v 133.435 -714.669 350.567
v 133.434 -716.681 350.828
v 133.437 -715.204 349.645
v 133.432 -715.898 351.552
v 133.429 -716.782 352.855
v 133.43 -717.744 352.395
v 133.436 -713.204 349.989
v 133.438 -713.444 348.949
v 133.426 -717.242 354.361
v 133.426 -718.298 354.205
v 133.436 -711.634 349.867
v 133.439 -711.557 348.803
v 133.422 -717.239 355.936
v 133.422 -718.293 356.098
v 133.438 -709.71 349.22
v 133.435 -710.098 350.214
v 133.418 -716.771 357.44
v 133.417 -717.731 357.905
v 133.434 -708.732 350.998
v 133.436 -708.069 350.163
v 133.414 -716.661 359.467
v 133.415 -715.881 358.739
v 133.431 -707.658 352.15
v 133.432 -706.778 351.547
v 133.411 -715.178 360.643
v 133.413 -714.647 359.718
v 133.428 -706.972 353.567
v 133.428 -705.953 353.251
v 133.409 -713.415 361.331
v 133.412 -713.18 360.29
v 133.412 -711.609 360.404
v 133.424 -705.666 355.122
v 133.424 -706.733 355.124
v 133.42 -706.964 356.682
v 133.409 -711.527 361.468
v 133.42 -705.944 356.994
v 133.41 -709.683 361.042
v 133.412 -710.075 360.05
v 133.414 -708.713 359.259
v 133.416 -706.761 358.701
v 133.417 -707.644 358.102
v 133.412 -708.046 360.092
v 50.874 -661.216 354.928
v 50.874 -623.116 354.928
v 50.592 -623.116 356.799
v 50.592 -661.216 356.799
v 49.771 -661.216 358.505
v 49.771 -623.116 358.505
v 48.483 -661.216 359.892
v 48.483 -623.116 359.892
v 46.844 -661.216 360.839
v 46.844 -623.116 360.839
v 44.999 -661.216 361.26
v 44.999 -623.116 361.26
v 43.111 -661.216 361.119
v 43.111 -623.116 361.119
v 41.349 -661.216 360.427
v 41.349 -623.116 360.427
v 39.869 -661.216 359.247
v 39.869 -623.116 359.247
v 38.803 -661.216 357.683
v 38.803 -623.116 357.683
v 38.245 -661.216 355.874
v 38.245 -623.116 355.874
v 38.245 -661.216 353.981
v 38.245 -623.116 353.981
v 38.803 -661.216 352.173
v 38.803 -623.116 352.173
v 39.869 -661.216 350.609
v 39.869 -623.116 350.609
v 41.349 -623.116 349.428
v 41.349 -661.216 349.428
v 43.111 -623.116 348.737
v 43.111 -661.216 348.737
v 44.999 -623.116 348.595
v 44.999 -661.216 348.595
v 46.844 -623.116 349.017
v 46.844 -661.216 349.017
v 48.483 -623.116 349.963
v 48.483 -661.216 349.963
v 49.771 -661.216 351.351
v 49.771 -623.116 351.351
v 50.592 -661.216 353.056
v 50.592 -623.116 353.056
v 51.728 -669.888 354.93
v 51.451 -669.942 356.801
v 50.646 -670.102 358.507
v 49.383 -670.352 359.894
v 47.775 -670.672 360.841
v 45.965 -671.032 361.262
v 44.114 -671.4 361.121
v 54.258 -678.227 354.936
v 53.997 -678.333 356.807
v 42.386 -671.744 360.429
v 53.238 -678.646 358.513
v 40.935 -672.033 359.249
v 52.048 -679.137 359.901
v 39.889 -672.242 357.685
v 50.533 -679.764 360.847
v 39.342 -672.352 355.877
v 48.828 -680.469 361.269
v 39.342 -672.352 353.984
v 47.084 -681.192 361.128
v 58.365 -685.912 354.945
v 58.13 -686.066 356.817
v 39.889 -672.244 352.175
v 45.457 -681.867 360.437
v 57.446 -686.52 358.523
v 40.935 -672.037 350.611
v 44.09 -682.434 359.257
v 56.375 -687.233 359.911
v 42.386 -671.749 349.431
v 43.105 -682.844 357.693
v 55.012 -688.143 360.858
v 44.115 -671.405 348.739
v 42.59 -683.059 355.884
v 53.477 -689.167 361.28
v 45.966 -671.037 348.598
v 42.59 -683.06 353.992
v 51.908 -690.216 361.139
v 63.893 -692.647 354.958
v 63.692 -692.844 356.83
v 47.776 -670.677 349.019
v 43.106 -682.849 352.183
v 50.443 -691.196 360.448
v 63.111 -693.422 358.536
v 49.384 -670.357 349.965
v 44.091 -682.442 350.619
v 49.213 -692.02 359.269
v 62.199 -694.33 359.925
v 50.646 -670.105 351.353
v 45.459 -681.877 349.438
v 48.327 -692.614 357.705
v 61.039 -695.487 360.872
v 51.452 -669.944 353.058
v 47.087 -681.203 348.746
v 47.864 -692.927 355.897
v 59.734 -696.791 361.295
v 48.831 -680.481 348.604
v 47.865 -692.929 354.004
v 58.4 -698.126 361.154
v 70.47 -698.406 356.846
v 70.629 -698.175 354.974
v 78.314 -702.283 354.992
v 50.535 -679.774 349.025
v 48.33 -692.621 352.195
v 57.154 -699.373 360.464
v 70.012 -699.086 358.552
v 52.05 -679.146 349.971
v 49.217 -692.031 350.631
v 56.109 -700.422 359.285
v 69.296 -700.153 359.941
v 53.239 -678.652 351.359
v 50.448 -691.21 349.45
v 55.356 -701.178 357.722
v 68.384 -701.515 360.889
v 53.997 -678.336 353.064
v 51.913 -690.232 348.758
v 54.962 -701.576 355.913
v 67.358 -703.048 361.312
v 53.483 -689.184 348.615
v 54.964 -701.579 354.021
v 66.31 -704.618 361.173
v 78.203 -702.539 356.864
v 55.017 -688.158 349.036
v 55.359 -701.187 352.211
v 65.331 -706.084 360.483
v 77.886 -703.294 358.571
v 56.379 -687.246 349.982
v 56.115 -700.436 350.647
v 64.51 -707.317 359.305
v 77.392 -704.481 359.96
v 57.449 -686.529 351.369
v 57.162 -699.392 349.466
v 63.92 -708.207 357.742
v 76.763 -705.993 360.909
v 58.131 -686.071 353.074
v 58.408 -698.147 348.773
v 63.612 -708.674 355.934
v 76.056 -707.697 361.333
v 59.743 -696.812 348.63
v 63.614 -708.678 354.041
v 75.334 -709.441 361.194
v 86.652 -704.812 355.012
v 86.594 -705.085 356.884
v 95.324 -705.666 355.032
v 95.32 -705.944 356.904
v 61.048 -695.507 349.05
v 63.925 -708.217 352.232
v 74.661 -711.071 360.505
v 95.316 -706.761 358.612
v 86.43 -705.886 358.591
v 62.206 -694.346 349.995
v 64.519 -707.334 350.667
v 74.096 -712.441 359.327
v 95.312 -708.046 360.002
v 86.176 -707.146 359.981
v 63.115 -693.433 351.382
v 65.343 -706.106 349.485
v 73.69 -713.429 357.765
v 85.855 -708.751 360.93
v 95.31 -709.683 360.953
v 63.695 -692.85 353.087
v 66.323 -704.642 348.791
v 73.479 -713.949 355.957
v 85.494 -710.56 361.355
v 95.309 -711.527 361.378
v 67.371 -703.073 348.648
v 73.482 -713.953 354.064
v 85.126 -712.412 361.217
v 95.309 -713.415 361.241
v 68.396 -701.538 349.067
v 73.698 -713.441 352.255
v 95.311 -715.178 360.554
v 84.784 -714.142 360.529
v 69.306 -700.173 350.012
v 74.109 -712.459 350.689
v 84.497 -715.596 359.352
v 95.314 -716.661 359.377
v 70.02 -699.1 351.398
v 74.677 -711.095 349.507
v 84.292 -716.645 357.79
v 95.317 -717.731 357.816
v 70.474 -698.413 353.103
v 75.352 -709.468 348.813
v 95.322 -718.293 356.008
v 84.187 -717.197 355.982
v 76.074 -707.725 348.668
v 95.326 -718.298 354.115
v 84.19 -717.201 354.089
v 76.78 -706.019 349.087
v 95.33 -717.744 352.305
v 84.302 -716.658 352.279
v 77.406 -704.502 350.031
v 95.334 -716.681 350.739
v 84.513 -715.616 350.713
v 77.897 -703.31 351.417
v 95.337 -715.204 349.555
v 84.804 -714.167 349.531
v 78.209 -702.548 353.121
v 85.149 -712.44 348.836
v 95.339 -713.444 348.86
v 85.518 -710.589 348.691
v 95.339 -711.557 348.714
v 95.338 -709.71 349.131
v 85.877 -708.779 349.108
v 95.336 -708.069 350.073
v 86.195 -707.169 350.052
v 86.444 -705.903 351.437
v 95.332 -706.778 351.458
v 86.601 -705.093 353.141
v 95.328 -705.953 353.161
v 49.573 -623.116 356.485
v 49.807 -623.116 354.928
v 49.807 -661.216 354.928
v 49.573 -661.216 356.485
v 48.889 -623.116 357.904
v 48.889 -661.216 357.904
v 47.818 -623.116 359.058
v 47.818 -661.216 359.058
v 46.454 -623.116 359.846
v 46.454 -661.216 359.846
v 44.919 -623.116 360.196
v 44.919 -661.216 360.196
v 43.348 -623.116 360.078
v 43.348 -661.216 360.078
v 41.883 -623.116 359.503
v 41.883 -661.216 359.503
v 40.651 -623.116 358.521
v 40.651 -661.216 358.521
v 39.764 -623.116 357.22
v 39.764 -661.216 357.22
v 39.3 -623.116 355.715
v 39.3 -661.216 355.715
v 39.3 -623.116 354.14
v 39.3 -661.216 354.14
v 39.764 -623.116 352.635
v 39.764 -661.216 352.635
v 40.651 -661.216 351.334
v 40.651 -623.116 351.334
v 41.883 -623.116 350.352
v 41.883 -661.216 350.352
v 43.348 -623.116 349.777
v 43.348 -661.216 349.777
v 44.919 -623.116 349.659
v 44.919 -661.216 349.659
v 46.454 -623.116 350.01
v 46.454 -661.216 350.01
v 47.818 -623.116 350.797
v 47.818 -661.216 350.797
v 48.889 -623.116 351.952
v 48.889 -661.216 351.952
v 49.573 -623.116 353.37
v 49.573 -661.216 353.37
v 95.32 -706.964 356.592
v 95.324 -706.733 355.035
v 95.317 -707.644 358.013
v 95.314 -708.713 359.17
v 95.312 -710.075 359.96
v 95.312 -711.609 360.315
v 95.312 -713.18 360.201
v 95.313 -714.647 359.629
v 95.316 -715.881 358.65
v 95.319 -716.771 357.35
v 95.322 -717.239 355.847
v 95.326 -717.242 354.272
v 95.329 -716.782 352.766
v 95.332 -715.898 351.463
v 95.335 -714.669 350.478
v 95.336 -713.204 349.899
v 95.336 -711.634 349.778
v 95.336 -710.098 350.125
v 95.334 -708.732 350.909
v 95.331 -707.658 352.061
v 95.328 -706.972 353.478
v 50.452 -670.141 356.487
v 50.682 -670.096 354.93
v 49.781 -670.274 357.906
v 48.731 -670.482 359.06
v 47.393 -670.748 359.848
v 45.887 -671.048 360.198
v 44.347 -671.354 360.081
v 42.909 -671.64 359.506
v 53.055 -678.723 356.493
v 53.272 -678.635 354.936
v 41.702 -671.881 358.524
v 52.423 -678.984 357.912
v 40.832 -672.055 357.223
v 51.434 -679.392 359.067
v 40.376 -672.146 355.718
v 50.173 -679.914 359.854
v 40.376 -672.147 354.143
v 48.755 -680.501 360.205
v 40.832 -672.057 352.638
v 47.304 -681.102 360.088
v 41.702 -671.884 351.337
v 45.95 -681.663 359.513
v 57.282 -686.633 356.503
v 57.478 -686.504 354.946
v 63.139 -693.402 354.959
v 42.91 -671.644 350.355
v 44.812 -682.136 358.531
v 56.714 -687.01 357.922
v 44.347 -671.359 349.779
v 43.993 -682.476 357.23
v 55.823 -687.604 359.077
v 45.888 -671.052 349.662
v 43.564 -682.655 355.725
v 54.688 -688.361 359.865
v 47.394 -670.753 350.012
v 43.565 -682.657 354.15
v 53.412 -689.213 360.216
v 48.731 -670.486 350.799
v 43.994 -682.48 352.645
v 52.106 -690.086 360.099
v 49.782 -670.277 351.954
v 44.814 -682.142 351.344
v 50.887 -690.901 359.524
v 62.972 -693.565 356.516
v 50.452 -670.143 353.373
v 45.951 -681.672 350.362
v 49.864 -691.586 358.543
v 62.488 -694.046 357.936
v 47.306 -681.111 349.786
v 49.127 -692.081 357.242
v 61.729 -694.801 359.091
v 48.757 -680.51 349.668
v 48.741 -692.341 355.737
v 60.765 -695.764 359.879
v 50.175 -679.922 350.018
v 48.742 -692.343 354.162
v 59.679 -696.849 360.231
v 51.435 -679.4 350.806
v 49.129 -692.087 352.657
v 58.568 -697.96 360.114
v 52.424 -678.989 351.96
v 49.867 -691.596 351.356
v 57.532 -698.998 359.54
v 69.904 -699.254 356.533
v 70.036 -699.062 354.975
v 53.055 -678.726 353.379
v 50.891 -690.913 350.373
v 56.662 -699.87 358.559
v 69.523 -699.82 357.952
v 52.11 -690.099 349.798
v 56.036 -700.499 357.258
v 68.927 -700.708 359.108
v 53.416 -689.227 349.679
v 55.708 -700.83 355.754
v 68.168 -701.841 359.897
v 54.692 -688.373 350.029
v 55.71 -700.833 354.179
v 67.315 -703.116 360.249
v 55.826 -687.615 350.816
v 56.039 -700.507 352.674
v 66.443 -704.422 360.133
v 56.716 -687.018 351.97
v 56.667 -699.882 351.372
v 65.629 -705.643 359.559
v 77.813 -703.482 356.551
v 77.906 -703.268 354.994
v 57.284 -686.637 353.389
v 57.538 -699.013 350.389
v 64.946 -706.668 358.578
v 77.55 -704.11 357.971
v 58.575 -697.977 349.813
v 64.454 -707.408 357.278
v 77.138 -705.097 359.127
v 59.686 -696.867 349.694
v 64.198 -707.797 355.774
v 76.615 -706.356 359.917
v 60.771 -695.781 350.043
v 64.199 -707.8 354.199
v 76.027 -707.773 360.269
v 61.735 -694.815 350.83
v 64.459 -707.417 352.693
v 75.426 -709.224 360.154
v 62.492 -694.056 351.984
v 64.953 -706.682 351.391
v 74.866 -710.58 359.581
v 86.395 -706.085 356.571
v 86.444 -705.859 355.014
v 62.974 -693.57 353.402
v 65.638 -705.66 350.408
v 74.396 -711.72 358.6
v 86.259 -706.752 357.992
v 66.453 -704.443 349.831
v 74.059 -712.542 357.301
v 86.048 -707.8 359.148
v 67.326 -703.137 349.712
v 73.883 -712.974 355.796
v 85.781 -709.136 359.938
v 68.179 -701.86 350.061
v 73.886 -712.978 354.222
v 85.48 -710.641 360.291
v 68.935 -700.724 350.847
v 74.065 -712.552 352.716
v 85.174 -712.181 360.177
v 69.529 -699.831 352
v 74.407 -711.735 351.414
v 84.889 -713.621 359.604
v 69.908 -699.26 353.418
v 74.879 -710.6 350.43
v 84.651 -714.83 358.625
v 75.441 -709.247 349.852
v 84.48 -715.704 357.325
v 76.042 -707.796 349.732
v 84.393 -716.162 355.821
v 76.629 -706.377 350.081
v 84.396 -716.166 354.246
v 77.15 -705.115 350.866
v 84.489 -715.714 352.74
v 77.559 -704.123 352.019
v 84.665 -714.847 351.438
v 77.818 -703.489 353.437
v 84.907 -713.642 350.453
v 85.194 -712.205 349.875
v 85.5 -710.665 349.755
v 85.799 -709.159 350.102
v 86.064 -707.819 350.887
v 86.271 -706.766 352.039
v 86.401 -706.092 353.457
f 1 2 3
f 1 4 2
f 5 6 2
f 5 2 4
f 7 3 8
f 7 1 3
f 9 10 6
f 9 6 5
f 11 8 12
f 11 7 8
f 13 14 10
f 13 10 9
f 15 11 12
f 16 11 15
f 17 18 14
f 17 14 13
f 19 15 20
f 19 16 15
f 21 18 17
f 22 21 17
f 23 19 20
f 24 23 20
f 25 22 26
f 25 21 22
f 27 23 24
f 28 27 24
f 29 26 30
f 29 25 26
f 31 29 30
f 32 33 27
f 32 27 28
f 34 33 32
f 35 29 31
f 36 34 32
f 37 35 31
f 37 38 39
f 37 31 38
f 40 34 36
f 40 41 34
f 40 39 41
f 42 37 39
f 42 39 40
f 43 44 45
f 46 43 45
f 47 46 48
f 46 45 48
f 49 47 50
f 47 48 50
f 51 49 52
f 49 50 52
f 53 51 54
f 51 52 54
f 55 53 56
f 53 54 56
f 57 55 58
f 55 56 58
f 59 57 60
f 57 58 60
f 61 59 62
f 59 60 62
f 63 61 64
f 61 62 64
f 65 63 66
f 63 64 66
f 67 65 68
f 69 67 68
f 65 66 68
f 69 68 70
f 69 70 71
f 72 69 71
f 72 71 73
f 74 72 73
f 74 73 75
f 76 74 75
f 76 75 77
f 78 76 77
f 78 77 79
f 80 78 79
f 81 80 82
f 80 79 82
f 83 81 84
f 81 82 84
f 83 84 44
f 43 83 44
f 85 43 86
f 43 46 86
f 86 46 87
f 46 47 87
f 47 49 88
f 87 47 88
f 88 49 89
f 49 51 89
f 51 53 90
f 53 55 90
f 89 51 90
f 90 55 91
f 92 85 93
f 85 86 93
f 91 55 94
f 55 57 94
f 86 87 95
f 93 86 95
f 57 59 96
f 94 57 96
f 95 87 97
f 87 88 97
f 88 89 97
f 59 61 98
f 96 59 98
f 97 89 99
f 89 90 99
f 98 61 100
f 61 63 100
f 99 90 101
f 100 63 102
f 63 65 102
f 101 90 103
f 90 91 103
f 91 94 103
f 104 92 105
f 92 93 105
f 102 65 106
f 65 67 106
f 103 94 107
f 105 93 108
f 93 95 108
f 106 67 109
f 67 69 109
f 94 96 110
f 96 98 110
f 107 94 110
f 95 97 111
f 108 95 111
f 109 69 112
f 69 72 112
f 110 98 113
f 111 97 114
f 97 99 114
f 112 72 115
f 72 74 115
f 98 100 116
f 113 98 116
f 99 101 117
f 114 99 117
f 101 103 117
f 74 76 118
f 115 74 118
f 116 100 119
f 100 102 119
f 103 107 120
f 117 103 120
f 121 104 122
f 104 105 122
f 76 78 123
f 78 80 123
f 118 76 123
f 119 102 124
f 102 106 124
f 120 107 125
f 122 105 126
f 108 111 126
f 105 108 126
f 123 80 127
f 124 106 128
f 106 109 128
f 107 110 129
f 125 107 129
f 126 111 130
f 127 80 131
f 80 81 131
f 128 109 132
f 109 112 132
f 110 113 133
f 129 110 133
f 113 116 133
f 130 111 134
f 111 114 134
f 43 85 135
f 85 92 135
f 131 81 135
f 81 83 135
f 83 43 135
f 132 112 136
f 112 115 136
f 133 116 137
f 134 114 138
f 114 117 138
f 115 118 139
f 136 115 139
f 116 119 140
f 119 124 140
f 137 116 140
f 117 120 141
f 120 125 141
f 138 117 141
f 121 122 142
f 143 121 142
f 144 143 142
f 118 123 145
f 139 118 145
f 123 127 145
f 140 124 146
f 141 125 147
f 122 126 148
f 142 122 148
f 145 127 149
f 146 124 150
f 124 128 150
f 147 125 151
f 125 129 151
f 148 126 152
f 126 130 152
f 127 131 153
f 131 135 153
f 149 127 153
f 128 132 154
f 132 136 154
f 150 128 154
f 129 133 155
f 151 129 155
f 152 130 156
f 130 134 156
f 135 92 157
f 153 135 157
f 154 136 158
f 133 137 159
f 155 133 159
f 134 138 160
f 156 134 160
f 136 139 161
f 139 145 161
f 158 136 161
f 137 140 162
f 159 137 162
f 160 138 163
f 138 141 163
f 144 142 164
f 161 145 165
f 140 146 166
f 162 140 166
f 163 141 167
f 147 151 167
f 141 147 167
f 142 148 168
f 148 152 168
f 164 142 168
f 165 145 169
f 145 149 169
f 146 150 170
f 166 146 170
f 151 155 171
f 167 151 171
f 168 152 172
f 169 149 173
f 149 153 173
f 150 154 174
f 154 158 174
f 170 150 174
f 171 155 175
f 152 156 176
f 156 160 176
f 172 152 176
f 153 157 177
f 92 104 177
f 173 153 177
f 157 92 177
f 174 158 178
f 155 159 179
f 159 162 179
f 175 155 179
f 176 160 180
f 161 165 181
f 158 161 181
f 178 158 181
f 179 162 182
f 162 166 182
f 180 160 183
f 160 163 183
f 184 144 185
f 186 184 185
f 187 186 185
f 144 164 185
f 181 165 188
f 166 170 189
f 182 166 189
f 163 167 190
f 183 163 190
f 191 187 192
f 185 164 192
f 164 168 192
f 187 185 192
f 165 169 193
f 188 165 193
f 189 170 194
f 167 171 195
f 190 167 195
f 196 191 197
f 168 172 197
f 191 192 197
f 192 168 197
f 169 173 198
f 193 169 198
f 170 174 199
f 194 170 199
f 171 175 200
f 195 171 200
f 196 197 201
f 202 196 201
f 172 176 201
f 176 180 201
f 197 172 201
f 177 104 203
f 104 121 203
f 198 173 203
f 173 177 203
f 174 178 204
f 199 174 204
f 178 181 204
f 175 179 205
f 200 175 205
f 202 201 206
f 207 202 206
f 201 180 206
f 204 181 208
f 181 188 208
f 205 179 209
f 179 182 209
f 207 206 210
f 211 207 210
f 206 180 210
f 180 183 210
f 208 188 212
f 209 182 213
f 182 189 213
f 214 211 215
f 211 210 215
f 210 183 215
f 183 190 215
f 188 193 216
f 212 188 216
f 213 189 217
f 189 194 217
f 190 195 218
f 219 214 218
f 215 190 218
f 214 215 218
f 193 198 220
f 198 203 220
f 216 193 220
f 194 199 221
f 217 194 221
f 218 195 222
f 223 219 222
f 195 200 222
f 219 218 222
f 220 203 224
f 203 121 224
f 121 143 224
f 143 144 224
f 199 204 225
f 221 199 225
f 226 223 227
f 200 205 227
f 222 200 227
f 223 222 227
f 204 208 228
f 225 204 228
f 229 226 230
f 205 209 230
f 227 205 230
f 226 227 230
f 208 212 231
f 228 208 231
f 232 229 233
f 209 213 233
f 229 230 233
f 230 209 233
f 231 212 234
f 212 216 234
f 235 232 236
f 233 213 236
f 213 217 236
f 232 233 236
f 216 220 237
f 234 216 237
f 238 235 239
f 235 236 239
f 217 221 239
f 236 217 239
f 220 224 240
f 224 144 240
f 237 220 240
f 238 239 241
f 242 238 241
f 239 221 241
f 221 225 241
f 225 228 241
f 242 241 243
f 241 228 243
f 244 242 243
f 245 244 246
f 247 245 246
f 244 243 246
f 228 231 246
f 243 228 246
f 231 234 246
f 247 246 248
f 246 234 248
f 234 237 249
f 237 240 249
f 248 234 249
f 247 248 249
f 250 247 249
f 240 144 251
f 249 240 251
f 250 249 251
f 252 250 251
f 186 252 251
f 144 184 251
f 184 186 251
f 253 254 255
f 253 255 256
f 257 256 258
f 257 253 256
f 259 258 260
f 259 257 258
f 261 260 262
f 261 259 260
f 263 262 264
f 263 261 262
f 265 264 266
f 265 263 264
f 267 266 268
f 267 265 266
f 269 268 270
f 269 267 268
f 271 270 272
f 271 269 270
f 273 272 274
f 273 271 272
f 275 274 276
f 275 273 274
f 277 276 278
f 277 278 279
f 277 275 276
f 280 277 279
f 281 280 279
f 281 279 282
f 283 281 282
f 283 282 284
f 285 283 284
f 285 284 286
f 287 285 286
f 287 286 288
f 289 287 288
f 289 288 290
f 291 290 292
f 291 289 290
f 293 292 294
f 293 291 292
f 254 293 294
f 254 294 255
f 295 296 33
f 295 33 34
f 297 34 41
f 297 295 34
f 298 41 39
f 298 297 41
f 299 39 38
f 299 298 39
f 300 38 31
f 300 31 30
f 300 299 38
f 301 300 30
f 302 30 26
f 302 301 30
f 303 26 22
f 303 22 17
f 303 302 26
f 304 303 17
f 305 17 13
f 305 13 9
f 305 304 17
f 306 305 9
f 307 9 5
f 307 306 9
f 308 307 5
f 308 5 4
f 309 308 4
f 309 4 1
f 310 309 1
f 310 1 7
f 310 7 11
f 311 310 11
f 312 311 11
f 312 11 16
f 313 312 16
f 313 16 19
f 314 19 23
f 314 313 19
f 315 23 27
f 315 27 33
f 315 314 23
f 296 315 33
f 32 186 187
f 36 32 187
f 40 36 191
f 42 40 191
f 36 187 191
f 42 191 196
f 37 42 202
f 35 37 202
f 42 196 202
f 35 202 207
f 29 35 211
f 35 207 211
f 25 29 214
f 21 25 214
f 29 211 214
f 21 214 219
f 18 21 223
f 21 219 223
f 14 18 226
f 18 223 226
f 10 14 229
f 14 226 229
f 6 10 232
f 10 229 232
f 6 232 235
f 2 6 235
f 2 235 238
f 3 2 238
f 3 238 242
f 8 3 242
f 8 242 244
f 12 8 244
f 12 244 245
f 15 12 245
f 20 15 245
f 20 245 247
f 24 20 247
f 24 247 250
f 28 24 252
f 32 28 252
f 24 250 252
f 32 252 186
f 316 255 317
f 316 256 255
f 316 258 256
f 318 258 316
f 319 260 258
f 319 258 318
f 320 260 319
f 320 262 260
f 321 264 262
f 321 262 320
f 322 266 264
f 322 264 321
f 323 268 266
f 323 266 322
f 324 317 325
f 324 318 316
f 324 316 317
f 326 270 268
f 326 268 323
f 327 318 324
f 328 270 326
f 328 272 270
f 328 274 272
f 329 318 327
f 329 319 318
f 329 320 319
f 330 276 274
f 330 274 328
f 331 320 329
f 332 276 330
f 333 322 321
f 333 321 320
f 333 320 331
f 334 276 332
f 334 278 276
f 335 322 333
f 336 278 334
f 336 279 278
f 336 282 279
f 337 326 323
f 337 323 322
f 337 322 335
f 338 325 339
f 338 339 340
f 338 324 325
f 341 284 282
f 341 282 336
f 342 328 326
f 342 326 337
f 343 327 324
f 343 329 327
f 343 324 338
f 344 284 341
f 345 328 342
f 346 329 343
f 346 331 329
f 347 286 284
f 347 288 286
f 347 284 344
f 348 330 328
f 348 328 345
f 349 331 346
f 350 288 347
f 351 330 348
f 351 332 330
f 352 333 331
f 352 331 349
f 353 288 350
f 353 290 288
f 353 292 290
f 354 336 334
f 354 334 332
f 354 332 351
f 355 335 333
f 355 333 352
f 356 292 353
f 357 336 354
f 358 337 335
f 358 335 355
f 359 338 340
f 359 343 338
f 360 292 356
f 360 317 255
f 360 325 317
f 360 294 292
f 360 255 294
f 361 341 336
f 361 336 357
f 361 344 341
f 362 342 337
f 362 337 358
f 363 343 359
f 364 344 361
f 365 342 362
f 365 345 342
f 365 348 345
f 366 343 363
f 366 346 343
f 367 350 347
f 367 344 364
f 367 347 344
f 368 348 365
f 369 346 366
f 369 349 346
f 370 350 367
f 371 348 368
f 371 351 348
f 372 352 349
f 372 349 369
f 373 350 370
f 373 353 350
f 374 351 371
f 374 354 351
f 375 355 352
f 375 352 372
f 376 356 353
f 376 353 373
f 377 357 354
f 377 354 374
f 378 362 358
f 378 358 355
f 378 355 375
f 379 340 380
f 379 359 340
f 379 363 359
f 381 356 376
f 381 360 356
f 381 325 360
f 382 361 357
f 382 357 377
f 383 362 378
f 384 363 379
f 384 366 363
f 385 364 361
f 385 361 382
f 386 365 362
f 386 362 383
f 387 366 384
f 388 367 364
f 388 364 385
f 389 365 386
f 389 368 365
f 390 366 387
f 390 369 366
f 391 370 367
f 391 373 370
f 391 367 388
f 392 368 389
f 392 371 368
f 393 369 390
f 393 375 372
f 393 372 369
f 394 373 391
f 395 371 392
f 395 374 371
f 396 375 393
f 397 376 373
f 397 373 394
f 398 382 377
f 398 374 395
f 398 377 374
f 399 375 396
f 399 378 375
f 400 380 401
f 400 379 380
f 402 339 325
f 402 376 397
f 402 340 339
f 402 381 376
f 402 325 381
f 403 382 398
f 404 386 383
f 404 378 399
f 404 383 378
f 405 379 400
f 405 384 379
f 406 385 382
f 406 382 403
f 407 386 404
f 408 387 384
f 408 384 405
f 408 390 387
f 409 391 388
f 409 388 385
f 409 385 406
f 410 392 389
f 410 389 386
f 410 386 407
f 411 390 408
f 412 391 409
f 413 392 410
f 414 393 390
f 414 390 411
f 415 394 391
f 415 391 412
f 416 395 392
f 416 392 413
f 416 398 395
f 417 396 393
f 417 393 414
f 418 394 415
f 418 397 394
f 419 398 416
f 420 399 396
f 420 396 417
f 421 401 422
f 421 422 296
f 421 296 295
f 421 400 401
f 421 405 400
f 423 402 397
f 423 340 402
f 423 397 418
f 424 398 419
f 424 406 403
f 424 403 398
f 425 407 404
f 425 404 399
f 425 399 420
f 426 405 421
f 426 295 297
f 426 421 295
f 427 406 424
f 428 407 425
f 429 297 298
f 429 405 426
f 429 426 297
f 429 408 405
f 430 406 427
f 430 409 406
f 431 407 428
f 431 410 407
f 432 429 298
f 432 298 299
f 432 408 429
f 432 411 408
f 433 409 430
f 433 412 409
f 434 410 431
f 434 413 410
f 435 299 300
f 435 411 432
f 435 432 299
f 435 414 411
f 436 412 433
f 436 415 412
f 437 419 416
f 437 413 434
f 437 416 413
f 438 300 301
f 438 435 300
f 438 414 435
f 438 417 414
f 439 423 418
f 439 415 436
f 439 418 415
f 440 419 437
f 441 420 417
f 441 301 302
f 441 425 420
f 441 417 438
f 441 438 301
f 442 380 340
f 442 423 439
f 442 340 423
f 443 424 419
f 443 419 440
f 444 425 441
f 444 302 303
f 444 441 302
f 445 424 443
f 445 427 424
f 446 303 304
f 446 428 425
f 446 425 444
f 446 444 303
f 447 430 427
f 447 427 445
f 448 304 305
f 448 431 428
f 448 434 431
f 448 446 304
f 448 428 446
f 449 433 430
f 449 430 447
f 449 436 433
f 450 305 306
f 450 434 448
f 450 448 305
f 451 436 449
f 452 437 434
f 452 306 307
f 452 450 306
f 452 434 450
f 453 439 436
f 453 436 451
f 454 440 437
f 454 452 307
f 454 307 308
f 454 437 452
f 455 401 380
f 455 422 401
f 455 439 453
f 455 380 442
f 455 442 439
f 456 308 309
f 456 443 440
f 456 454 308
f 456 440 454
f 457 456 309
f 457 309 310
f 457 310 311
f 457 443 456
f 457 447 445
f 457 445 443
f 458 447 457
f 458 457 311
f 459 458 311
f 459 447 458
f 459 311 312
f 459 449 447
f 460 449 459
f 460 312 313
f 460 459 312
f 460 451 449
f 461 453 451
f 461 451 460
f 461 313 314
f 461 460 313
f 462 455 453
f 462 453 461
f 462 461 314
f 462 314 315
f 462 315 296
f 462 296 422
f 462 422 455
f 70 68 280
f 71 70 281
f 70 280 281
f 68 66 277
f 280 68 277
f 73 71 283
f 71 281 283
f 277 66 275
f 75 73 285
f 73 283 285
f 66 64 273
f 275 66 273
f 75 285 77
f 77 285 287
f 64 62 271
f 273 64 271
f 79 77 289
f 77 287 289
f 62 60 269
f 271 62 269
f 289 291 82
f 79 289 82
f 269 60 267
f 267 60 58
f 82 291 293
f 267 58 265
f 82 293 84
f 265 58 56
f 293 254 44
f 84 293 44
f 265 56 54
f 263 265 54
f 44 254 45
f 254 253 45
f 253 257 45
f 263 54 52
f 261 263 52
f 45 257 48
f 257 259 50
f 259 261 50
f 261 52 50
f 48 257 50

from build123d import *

# Parameters (mm, degrees)
SKETCH1_R                 = 6.35
SKETCH1_R_2               = 5.2832
PIPE_0_5_SCH_40_1_DEPTH   = 38.1
SKETCH1_ON_SEGMENT_2_R    = 6.35
SKETCH1_ON_SEGMENT_2_R_2  = 5.2832
PIPE_0_5_SCH_40_1_2_ANGLE = 90
SKETCH1_ON_SEGMENT_3_R    = 6.35
SKETCH1_ON_SEGMENT_3_R_2  = 5.2832
PIPE_0_5_SCH_40_1_3_DEPTH = 38.1


with BuildPart() as part:
    # Sketch1 → Pipe 0.5 SCH 40(1) (new body)
    with BuildSketch(Plane(origin=(44.524118781, -623.116394341, 354.927728694), x_dir=(1, 0, 0), z_dir=(0, -1, 0))):
        Circle(SKETCH1_R)
        Circle(SKETCH1_R_2, mode=Mode.SUBTRACT)
    extrude(amount=PIPE_0_5_SCH_40_1_DEPTH)


with BuildPart() as body_2:
    # Sketch1 on segment 2 (carried to the start of arc 2) → Pipe 0.5 SCH 40_1 2 (revolve)
    with BuildSketch(Plane(origin=(44.524118781, -661.216394341, 354.927728694), x_dir=(1, 0, 0), z_dir=(0, -1, 0))):
        Circle(SKETCH1_ON_SEGMENT_2_R)
        Circle(SKETCH1_ON_SEGMENT_2_R_2, mode=Mode.SUBTRACT)
    revolve(axis=Axis((95.323978696, -661.216394341, 355.047029303), (-0.002348437, 0, 0.999997242)), revolution_arc=PIPE_0_5_SCH_40_1_2_ANGLE)


with BuildPart() as body_3:
    # Sketch1 on segment 3 (carried to segment 3) → Pipe 0.5 SCH 40_1 3 (new body)
    with BuildSketch(Plane(origin=(95.323978696, -712.016394341, 355.047029303), x_dir=(5.515e-06, 0.999997242, -0.002348431), z_dir=(0.999997242, 0, 0.002348437))):
        Circle(SKETCH1_ON_SEGMENT_3_R)
        Circle(SKETCH1_ON_SEGMENT_3_R_2, mode=Mode.SUBTRACT)
    extrude(amount=PIPE_0_5_SCH_40_1_3_DEPTH)


with BuildPart() as part_1:
    add(part.part)

    # Pipe 0.5 SCH 40(1) as one body: union body 2, body 3
    add(body_2.part)
    add(body_3.part)


solid = part_1.part
